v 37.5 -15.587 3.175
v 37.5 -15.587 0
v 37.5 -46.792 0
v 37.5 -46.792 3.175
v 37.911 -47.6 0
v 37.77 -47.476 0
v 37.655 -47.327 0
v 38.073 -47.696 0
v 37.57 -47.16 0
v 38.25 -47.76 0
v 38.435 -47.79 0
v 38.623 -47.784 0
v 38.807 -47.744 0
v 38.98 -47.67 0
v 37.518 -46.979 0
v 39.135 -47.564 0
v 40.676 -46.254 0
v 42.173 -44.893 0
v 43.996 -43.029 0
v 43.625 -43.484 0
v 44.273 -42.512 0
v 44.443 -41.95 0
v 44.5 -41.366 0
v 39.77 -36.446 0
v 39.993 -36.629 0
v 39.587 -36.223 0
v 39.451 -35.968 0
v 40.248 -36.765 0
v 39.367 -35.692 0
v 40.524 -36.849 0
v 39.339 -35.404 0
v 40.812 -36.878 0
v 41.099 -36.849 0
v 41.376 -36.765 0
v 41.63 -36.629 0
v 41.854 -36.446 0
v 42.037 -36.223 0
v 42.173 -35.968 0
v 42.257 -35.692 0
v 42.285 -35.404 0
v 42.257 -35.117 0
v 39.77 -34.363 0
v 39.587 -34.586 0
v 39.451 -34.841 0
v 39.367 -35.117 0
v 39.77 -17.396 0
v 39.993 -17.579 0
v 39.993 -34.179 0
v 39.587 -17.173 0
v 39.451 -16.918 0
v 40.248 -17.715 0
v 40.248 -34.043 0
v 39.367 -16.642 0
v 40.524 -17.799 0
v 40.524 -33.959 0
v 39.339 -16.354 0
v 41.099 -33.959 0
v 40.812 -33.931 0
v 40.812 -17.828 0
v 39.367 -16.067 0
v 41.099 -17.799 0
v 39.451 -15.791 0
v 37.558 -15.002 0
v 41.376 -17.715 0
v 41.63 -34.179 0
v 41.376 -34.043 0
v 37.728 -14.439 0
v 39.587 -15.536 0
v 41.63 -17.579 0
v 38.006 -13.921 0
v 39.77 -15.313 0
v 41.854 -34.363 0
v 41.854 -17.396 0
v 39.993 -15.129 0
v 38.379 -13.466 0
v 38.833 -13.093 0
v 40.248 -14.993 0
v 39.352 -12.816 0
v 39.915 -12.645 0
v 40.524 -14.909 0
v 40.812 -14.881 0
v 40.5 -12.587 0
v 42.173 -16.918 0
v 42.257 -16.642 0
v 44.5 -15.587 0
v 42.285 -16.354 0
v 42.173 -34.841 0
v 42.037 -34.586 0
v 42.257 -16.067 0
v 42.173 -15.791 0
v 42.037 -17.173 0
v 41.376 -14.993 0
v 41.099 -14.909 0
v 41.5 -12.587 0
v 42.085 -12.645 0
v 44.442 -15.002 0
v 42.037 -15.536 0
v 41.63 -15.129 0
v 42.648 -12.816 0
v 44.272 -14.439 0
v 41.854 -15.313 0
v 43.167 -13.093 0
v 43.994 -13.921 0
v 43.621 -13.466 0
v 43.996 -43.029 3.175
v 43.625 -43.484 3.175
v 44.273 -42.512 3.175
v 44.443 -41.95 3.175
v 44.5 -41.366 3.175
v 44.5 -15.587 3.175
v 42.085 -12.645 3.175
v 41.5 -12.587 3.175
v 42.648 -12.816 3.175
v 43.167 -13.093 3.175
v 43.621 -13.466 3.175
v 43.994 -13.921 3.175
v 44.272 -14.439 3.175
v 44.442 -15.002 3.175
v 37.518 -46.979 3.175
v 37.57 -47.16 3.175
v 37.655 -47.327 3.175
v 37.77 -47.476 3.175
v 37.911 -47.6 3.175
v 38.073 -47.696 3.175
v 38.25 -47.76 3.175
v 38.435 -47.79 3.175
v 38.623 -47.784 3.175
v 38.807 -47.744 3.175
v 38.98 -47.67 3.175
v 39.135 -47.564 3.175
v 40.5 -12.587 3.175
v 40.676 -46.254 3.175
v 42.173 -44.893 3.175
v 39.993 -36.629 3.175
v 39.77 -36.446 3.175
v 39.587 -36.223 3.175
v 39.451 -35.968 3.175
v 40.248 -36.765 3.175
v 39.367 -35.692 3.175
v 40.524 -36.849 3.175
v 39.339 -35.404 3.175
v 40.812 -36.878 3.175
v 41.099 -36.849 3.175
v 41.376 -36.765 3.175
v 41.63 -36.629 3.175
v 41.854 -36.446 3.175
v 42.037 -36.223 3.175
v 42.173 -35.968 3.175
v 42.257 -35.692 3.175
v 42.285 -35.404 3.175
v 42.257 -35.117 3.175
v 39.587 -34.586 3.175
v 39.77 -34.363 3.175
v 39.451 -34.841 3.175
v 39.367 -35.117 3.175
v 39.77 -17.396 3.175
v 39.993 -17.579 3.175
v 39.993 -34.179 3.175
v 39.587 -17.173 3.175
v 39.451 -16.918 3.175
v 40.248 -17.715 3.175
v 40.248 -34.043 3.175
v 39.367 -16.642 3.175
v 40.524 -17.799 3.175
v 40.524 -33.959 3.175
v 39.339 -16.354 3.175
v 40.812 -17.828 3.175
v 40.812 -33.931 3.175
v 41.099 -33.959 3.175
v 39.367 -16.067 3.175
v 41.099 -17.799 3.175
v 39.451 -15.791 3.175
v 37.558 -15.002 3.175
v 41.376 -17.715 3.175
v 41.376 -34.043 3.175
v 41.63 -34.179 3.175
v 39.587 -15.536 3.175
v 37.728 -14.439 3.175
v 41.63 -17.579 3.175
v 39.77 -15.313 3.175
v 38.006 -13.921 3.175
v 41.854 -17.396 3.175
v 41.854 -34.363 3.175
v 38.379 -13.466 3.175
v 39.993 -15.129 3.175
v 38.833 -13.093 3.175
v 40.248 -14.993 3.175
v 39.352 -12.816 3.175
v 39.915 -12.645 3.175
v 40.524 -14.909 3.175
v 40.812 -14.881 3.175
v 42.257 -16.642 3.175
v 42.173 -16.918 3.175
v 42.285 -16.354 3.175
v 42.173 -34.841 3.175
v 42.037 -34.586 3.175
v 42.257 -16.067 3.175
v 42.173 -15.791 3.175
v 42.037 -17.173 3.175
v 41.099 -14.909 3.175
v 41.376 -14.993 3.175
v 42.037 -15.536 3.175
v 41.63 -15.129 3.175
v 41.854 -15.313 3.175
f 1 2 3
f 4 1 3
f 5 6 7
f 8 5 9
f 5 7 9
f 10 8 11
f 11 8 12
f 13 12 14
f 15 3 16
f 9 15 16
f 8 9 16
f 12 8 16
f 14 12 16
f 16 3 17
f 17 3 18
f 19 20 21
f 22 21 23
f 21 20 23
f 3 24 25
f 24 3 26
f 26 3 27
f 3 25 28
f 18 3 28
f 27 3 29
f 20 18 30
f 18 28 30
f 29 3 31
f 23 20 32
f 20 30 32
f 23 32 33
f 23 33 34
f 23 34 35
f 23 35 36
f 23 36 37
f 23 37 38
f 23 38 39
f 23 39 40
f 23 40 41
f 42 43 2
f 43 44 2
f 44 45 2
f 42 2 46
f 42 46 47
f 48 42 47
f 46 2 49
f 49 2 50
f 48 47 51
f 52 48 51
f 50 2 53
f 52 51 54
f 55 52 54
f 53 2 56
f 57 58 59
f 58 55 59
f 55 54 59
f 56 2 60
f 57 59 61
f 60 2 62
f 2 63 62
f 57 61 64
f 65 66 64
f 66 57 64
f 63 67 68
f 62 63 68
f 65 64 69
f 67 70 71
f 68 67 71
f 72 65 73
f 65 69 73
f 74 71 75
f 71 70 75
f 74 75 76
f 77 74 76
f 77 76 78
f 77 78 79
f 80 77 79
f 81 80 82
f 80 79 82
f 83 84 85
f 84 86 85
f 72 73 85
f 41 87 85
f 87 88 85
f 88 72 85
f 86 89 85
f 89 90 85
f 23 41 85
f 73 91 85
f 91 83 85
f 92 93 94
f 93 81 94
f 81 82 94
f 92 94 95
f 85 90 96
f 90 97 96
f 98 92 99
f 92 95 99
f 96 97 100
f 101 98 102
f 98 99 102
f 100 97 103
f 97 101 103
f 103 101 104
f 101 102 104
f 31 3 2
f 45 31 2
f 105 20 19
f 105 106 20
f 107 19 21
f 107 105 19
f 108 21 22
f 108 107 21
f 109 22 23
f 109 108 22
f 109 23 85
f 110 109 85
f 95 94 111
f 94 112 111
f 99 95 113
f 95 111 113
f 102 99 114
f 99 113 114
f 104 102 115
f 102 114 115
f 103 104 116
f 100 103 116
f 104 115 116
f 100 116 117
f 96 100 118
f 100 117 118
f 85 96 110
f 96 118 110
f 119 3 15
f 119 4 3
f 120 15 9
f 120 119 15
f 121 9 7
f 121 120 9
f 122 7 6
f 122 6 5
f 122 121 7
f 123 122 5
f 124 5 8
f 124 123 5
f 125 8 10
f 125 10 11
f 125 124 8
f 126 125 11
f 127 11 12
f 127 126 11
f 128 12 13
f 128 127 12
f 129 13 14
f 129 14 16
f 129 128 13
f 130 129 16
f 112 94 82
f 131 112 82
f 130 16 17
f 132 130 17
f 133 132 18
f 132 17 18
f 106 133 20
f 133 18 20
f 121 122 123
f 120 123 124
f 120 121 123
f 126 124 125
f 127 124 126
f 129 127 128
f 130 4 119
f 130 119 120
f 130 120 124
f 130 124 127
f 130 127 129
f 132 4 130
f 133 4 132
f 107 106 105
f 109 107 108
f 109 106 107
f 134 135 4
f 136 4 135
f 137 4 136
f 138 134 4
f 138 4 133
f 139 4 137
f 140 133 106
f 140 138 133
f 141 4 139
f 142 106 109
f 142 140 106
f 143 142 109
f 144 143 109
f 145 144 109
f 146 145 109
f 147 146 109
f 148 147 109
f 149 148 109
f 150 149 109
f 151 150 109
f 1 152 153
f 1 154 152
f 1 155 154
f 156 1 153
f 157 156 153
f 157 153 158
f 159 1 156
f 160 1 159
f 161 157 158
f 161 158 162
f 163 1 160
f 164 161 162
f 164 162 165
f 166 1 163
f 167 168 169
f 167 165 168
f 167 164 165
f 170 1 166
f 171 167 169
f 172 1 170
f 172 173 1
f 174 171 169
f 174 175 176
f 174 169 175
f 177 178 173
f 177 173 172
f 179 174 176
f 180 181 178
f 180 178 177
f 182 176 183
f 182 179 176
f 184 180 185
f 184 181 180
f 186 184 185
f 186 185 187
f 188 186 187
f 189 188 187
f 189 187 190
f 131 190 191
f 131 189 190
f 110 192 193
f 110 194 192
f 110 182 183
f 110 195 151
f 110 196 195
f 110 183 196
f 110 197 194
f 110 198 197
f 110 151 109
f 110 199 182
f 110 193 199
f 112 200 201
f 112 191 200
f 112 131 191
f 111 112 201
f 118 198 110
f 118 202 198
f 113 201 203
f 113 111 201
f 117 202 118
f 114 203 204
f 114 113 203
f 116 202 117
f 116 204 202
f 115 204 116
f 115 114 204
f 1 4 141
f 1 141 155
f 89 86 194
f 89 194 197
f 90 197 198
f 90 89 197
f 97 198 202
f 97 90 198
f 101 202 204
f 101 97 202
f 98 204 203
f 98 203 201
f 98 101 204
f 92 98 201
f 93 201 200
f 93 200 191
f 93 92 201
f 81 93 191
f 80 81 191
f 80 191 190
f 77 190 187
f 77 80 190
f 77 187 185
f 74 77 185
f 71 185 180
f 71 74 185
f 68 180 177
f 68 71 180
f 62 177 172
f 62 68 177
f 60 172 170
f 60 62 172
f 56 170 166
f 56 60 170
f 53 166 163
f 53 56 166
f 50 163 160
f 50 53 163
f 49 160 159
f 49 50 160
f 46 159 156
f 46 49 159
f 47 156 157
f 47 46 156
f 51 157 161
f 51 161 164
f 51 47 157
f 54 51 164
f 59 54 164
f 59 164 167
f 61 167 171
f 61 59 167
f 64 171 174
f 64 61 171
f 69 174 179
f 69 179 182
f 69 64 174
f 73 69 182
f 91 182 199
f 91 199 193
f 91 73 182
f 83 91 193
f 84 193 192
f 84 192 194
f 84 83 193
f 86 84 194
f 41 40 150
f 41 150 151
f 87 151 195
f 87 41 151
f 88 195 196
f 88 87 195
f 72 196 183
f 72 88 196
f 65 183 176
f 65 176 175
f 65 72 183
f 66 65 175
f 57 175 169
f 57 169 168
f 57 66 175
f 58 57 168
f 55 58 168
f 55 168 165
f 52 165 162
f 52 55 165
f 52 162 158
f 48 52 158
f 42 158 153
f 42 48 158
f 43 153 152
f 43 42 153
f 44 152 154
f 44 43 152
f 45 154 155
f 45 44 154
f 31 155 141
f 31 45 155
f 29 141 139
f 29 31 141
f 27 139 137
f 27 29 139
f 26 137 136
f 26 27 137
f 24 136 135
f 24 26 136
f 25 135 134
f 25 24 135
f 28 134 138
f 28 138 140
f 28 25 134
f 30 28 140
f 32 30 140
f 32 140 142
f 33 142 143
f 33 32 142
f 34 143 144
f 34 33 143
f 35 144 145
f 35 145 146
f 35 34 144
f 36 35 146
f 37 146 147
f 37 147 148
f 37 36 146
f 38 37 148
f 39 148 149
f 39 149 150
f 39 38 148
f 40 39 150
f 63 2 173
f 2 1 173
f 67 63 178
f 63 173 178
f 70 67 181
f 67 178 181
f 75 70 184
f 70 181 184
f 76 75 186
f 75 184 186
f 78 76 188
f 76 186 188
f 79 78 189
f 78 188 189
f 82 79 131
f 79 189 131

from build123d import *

# Parameters (mm, degrees)
SKETCH1_R           = 1.4732
BOSS_EXTRUDE1_DEPTH = 3.175
FILLET1_R           = 3
FILLET2_R           = 1


with BuildPart() as part:
    # Sketch1 → Boss-Extrude1 (new body)
    with BuildSketch(Plane.XY):
        with BuildLine():
            Line((37.5, -12.587486719), (37.5, -48.86403611))
            ThreePointArc((37.5, -48.86403611), (41.119931518, -45.859516536), (44.5, -42.587486719))
            Line((44.5, -42.587486719), (44.5, -41.365734914))
            Line((44.5, -41.365734914), (44.5, -15.587486719))
            Line((44.5, -15.587486719), (44.5, -12.587486719))
            Line((44.5, -12.587486719), (37.5, -12.587486719))
        make_face()
        with Locations((40.81189221, -16.354311186)):
            Circle(SKETCH1_R, mode=Mode.SUBTRACT)
        with Locations((40.81189221, -35.404311186)):
            Circle(SKETCH1_R, mode=Mode.SUBTRACT)
    extrude(amount=BOSS_EXTRUDE1_DEPTH)

    # Fillet1
    fillet1_edges = [part.edges().sort_by_distance(p)[0] for p in [
        (44.5, -12.587486719, 1.5875),
        (44.5, -42.587486719, 1.5875),
        (37.5, -12.587486719, 1.5875),
    ]]
    fillet(fillet1_edges, radius=FILLET1_R)

    # Fillet2
    fillet2_edges = [part.edges().sort_by_distance(p)[0] for p in [
        (37.5, -48.86403611, 1.5875),
    ]]
    fillet(fillet2_edges, radius=FILLET2_R)


solid = part.part
